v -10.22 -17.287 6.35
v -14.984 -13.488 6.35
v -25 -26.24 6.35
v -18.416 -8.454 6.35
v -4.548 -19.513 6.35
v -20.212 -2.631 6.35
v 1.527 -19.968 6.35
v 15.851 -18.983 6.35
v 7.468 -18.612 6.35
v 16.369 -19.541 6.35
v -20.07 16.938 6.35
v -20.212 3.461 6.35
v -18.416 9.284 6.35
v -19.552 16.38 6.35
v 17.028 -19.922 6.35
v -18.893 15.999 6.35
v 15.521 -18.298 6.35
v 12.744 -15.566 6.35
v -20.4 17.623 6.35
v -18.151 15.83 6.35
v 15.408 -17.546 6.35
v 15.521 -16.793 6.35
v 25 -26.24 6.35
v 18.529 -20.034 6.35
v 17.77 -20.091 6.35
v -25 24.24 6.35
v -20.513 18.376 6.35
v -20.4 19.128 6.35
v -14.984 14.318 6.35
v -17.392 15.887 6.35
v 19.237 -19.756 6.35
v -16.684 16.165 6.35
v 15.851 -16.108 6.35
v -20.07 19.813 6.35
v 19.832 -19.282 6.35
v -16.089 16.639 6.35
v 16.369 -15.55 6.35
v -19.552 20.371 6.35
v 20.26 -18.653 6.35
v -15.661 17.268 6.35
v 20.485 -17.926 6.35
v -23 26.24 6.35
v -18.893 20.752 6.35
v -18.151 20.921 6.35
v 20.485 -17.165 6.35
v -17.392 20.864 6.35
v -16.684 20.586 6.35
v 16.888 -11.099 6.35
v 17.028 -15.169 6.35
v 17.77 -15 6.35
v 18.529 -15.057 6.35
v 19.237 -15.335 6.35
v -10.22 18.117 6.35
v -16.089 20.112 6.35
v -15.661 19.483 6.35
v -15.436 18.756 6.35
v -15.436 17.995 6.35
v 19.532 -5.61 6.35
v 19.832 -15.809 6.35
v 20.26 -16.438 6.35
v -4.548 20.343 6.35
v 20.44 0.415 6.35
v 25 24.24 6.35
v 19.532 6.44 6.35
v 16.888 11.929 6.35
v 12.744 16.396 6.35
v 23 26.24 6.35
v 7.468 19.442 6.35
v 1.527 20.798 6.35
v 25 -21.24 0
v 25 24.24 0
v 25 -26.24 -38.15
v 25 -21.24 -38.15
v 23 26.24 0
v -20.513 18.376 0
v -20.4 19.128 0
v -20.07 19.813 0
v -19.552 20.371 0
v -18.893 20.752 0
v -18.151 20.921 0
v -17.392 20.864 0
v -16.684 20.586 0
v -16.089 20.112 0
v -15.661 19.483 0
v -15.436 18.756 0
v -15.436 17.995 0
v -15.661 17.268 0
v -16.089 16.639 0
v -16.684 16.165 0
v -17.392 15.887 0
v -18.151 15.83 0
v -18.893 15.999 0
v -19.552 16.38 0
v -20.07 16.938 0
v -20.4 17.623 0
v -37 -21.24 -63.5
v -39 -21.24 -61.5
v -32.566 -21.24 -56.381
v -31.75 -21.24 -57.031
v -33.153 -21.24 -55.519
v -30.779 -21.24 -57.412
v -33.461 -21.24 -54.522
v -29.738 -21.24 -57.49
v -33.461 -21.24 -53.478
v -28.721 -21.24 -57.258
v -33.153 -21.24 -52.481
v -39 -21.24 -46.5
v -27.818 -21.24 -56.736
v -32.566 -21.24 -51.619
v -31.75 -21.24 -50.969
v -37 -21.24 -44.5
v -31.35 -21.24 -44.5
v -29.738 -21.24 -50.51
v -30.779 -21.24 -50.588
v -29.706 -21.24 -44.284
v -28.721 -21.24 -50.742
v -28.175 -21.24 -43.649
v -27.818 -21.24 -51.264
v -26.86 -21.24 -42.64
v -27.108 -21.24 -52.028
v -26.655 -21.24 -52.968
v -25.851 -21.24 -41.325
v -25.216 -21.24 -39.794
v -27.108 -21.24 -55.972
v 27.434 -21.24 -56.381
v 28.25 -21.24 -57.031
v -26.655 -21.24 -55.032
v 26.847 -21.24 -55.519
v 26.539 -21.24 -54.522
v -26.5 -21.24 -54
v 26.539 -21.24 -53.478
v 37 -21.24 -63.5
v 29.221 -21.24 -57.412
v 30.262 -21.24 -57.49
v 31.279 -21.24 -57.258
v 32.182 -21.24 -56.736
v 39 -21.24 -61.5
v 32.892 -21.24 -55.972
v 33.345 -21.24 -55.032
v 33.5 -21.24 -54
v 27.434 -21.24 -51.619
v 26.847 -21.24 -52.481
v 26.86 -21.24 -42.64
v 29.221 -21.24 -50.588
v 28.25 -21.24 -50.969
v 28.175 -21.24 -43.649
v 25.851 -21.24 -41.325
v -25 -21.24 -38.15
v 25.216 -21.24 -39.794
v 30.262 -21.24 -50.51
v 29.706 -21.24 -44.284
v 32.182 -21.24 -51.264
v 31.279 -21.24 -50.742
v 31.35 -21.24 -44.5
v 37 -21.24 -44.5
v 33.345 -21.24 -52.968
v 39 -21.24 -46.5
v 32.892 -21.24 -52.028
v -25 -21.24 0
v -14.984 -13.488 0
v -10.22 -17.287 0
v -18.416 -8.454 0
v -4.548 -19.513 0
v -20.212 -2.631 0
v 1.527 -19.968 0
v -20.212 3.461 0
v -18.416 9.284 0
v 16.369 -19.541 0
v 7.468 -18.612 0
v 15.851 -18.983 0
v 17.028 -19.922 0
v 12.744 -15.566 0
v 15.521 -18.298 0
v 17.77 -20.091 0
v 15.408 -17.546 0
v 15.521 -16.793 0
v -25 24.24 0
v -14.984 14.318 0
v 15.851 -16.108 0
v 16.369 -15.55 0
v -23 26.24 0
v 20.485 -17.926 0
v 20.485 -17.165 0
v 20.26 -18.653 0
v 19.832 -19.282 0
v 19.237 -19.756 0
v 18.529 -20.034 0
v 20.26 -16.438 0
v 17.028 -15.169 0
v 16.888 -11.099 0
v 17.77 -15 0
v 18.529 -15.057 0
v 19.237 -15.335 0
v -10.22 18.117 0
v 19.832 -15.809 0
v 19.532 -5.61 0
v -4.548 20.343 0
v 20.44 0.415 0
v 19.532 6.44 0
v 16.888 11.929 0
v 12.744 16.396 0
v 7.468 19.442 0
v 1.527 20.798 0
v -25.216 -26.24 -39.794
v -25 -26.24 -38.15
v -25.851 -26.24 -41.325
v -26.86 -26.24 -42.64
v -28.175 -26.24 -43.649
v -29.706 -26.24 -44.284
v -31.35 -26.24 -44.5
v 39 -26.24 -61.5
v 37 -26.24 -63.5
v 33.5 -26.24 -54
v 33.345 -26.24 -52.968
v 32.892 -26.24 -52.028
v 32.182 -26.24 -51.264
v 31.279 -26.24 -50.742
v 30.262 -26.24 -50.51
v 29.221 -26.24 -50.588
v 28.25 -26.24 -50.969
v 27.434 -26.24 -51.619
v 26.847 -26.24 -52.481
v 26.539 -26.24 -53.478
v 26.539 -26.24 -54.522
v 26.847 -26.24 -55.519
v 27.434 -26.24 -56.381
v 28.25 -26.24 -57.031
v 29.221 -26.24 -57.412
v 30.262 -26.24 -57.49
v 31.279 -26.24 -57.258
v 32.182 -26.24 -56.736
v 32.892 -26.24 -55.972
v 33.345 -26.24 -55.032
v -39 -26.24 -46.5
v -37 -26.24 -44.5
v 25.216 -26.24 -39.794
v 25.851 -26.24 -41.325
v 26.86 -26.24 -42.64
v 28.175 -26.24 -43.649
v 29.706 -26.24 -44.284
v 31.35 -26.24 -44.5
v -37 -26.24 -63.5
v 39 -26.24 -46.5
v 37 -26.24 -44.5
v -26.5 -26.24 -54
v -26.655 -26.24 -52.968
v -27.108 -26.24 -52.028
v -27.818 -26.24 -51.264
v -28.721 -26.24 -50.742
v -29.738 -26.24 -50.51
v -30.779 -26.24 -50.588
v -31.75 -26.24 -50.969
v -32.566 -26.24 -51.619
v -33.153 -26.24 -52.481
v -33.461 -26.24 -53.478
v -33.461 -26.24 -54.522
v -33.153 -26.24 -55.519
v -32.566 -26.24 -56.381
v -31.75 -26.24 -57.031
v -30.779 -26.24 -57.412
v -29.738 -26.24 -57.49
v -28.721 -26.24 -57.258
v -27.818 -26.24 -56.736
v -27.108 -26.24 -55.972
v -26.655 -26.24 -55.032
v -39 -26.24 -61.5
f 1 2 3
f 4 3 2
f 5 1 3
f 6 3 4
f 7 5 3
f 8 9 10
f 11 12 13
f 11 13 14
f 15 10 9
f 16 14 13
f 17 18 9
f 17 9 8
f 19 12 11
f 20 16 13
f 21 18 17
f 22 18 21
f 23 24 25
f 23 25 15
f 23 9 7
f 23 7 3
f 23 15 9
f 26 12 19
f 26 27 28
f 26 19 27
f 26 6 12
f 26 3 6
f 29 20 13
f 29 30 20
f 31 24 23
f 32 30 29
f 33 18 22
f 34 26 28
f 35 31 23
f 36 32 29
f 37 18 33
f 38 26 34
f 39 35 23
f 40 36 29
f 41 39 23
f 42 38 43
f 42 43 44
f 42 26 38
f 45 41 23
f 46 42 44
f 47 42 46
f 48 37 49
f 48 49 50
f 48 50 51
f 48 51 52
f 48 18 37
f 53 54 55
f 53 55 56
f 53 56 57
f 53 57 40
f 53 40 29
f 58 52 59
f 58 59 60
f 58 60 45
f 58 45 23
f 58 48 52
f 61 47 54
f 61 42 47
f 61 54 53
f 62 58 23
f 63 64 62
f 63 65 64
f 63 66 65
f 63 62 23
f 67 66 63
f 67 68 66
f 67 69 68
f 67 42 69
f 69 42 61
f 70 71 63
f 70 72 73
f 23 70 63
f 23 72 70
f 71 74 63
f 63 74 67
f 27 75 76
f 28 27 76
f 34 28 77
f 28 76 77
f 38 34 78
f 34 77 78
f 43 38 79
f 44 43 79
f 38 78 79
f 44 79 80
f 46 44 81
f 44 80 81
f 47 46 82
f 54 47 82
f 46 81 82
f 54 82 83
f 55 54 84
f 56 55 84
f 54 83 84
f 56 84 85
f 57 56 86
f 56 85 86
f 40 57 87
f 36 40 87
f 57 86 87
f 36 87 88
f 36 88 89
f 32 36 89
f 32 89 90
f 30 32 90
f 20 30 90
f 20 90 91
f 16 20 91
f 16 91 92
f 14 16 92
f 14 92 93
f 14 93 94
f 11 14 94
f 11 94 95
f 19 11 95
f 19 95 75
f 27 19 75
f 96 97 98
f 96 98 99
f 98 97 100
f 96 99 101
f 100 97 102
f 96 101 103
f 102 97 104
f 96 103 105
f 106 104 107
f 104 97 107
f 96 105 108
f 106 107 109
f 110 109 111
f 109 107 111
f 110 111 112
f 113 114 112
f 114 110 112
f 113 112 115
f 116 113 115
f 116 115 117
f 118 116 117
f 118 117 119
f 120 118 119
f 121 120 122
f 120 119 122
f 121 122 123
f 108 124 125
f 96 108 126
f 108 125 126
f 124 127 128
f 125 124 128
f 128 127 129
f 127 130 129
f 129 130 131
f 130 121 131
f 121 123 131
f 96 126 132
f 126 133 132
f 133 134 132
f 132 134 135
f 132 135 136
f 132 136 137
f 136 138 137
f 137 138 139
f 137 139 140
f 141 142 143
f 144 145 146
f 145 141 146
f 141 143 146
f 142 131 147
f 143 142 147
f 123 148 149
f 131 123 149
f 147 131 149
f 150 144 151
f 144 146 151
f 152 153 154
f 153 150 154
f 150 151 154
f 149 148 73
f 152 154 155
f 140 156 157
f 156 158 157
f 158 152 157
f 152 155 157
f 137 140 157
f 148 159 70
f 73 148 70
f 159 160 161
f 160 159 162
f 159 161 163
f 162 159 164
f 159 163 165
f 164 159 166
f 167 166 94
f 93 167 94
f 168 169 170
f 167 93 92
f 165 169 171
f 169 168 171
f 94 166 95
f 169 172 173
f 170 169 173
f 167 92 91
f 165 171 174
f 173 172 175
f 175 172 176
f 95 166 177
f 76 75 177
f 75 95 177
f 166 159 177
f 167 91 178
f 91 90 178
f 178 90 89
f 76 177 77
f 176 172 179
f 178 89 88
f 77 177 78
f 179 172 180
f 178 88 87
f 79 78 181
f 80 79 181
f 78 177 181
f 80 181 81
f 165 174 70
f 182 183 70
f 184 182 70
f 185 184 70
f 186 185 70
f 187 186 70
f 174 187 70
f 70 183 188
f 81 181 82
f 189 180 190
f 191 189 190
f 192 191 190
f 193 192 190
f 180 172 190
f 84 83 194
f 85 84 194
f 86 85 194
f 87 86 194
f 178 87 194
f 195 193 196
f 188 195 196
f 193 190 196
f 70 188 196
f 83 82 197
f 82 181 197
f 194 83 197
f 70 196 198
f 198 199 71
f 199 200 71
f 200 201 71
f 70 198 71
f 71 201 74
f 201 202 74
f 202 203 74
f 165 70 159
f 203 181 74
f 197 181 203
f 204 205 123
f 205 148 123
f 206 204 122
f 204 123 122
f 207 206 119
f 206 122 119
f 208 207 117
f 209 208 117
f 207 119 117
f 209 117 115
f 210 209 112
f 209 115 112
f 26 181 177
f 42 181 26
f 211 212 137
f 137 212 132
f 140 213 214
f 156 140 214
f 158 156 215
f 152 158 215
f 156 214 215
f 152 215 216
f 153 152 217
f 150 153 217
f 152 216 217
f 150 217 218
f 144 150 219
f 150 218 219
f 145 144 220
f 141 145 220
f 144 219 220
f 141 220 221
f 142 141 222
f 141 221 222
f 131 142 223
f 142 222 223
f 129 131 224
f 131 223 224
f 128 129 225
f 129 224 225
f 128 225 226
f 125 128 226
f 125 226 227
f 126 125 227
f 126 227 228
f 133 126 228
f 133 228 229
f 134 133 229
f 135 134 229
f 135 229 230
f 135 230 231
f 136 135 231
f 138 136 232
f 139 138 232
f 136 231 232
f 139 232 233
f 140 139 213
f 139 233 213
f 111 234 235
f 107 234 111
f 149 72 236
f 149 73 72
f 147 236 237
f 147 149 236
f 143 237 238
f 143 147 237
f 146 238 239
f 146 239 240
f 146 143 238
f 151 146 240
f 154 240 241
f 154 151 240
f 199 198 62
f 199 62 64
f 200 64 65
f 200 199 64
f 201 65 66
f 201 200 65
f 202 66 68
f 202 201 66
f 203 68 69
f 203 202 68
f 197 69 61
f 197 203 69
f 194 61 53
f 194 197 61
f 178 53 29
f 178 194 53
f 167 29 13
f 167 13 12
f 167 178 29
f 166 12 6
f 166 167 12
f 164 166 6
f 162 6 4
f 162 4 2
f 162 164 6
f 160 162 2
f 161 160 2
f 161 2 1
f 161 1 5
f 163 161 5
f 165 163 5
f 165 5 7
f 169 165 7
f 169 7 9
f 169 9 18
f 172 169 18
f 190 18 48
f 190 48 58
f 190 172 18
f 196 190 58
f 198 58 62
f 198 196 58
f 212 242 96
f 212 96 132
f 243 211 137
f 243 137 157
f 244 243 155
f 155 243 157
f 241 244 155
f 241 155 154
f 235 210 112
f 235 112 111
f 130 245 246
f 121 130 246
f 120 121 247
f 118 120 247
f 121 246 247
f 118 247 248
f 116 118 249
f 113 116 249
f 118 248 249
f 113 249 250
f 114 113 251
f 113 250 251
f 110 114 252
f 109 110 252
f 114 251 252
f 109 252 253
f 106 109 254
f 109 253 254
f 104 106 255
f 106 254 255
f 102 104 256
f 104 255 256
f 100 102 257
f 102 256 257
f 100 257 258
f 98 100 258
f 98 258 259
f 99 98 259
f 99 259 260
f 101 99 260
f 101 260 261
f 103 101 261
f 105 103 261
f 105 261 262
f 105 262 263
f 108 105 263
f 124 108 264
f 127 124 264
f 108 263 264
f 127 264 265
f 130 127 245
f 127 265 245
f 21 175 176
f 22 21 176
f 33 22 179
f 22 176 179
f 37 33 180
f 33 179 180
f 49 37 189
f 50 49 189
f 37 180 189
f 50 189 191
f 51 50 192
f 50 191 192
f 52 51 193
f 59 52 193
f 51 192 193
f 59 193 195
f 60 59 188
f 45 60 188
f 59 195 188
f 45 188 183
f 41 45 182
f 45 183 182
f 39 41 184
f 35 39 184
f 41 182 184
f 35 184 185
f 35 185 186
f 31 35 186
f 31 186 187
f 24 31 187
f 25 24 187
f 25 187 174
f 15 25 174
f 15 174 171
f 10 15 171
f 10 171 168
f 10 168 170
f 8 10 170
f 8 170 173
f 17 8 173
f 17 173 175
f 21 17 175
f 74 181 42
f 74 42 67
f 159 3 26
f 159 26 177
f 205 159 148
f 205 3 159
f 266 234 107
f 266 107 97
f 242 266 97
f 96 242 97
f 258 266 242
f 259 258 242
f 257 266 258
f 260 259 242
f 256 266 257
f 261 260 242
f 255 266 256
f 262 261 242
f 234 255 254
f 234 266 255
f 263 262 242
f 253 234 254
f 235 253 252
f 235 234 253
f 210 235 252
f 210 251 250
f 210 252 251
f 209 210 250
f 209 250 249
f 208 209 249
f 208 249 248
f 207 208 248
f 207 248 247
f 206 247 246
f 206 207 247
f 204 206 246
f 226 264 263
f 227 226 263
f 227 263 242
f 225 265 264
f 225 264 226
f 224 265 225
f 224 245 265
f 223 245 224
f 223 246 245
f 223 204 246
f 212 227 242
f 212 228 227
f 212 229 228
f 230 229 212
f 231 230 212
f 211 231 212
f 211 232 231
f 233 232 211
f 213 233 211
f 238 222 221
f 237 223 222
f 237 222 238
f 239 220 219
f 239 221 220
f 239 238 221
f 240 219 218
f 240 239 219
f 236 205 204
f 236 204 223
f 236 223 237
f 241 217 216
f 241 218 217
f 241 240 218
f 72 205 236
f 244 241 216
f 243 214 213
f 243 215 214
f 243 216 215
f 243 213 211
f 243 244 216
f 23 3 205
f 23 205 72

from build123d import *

# Parameters (mm, degrees)
SKETCH1_W                  = 50
SKETCH1_H                  = 52.48
SKETCH1_R                  = 20.44
BOSS_EXTRUDE1_DEPTH        = 6.35
SKETCH4_R                  = 3.5
BOSS_EXTRUDE4_DEPTH        = 5
F_10_CLEARANCE_HOLE1_D     = 5.1054
F_10_CLEARANCE_HOLE1_DEPTH = 6.35
FILLET1_R                  = 6.35
CHAMFER1_SIZE              = 2
CHAMFER2_SIZE              = 2


with BuildPart() as part:
    # Sketch1 → Boss-Extrude1 (new body)
    with BuildSketch(Plane.XY):
        Rectangle(SKETCH1_W, SKETCH1_H)
        with Locations((0, 0.415)):
            Circle(SKETCH1_R, mode=Mode.SUBTRACT)
    extrude(amount=BOSS_EXTRUDE1_DEPTH)

    # Sketch4 → Boss-Extrude4 (add)
    with BuildSketch(Plane.XZ.offset(26.24)):
        Polygon((25, -44.5), (25, 0), (-25, 0), (-25, -44.5), (-39, -44.5), (-39, -63.5), (39, -63.5), (39, -44.5), align=None)
        with Locations((30, -54)):
            Circle(SKETCH4_R, mode=Mode.SUBTRACT)
        with Locations((-30, -54)):
            Circle(SKETCH4_R, mode=Mode.SUBTRACT)
    extrude(amount=-BOSS_EXTRUDE4_DEPTH)

    # #10 Clearance Hole1
    with Locations(Plane.XY.offset(6.35)):
        with Locations((17.960512242, -17.545512242), (-17.960512242, 18.375512242)):
            Hole(F_10_CLEARANCE_HOLE1_D / 2, depth=F_10_CLEARANCE_HOLE1_DEPTH)

    # Fillet1
    fillet1_edges = [part.edges().sort_by_distance(p)[0] for p in [
        (-25, -23.74, -44.5),
        (25, -23.74, -44.5),
    ]]
    fillet(fillet1_edges, radius=FILLET1_R)

    # Chamfer1
    chamfer1_edges = [part.edges().sort_by_distance(p)[0] for p in [
        (39, -23.74, -44.5),
        (39, -23.74, -63.5),
        (-39, -23.74, -63.5),
        (-39, -23.74, -44.5),
    ]]
    chamfer(chamfer1_edges, length=CHAMFER1_SIZE)

    # Chamfer2
    chamfer2_edges = [part.edges().sort_by_distance(p)[0] for p in [
        (-25, 26.24, 3.175),
        (25, 26.24, 3.175),
    ]]
    chamfer(chamfer2_edges, length=CHAMFER2_SIZE)


solid = part.part
